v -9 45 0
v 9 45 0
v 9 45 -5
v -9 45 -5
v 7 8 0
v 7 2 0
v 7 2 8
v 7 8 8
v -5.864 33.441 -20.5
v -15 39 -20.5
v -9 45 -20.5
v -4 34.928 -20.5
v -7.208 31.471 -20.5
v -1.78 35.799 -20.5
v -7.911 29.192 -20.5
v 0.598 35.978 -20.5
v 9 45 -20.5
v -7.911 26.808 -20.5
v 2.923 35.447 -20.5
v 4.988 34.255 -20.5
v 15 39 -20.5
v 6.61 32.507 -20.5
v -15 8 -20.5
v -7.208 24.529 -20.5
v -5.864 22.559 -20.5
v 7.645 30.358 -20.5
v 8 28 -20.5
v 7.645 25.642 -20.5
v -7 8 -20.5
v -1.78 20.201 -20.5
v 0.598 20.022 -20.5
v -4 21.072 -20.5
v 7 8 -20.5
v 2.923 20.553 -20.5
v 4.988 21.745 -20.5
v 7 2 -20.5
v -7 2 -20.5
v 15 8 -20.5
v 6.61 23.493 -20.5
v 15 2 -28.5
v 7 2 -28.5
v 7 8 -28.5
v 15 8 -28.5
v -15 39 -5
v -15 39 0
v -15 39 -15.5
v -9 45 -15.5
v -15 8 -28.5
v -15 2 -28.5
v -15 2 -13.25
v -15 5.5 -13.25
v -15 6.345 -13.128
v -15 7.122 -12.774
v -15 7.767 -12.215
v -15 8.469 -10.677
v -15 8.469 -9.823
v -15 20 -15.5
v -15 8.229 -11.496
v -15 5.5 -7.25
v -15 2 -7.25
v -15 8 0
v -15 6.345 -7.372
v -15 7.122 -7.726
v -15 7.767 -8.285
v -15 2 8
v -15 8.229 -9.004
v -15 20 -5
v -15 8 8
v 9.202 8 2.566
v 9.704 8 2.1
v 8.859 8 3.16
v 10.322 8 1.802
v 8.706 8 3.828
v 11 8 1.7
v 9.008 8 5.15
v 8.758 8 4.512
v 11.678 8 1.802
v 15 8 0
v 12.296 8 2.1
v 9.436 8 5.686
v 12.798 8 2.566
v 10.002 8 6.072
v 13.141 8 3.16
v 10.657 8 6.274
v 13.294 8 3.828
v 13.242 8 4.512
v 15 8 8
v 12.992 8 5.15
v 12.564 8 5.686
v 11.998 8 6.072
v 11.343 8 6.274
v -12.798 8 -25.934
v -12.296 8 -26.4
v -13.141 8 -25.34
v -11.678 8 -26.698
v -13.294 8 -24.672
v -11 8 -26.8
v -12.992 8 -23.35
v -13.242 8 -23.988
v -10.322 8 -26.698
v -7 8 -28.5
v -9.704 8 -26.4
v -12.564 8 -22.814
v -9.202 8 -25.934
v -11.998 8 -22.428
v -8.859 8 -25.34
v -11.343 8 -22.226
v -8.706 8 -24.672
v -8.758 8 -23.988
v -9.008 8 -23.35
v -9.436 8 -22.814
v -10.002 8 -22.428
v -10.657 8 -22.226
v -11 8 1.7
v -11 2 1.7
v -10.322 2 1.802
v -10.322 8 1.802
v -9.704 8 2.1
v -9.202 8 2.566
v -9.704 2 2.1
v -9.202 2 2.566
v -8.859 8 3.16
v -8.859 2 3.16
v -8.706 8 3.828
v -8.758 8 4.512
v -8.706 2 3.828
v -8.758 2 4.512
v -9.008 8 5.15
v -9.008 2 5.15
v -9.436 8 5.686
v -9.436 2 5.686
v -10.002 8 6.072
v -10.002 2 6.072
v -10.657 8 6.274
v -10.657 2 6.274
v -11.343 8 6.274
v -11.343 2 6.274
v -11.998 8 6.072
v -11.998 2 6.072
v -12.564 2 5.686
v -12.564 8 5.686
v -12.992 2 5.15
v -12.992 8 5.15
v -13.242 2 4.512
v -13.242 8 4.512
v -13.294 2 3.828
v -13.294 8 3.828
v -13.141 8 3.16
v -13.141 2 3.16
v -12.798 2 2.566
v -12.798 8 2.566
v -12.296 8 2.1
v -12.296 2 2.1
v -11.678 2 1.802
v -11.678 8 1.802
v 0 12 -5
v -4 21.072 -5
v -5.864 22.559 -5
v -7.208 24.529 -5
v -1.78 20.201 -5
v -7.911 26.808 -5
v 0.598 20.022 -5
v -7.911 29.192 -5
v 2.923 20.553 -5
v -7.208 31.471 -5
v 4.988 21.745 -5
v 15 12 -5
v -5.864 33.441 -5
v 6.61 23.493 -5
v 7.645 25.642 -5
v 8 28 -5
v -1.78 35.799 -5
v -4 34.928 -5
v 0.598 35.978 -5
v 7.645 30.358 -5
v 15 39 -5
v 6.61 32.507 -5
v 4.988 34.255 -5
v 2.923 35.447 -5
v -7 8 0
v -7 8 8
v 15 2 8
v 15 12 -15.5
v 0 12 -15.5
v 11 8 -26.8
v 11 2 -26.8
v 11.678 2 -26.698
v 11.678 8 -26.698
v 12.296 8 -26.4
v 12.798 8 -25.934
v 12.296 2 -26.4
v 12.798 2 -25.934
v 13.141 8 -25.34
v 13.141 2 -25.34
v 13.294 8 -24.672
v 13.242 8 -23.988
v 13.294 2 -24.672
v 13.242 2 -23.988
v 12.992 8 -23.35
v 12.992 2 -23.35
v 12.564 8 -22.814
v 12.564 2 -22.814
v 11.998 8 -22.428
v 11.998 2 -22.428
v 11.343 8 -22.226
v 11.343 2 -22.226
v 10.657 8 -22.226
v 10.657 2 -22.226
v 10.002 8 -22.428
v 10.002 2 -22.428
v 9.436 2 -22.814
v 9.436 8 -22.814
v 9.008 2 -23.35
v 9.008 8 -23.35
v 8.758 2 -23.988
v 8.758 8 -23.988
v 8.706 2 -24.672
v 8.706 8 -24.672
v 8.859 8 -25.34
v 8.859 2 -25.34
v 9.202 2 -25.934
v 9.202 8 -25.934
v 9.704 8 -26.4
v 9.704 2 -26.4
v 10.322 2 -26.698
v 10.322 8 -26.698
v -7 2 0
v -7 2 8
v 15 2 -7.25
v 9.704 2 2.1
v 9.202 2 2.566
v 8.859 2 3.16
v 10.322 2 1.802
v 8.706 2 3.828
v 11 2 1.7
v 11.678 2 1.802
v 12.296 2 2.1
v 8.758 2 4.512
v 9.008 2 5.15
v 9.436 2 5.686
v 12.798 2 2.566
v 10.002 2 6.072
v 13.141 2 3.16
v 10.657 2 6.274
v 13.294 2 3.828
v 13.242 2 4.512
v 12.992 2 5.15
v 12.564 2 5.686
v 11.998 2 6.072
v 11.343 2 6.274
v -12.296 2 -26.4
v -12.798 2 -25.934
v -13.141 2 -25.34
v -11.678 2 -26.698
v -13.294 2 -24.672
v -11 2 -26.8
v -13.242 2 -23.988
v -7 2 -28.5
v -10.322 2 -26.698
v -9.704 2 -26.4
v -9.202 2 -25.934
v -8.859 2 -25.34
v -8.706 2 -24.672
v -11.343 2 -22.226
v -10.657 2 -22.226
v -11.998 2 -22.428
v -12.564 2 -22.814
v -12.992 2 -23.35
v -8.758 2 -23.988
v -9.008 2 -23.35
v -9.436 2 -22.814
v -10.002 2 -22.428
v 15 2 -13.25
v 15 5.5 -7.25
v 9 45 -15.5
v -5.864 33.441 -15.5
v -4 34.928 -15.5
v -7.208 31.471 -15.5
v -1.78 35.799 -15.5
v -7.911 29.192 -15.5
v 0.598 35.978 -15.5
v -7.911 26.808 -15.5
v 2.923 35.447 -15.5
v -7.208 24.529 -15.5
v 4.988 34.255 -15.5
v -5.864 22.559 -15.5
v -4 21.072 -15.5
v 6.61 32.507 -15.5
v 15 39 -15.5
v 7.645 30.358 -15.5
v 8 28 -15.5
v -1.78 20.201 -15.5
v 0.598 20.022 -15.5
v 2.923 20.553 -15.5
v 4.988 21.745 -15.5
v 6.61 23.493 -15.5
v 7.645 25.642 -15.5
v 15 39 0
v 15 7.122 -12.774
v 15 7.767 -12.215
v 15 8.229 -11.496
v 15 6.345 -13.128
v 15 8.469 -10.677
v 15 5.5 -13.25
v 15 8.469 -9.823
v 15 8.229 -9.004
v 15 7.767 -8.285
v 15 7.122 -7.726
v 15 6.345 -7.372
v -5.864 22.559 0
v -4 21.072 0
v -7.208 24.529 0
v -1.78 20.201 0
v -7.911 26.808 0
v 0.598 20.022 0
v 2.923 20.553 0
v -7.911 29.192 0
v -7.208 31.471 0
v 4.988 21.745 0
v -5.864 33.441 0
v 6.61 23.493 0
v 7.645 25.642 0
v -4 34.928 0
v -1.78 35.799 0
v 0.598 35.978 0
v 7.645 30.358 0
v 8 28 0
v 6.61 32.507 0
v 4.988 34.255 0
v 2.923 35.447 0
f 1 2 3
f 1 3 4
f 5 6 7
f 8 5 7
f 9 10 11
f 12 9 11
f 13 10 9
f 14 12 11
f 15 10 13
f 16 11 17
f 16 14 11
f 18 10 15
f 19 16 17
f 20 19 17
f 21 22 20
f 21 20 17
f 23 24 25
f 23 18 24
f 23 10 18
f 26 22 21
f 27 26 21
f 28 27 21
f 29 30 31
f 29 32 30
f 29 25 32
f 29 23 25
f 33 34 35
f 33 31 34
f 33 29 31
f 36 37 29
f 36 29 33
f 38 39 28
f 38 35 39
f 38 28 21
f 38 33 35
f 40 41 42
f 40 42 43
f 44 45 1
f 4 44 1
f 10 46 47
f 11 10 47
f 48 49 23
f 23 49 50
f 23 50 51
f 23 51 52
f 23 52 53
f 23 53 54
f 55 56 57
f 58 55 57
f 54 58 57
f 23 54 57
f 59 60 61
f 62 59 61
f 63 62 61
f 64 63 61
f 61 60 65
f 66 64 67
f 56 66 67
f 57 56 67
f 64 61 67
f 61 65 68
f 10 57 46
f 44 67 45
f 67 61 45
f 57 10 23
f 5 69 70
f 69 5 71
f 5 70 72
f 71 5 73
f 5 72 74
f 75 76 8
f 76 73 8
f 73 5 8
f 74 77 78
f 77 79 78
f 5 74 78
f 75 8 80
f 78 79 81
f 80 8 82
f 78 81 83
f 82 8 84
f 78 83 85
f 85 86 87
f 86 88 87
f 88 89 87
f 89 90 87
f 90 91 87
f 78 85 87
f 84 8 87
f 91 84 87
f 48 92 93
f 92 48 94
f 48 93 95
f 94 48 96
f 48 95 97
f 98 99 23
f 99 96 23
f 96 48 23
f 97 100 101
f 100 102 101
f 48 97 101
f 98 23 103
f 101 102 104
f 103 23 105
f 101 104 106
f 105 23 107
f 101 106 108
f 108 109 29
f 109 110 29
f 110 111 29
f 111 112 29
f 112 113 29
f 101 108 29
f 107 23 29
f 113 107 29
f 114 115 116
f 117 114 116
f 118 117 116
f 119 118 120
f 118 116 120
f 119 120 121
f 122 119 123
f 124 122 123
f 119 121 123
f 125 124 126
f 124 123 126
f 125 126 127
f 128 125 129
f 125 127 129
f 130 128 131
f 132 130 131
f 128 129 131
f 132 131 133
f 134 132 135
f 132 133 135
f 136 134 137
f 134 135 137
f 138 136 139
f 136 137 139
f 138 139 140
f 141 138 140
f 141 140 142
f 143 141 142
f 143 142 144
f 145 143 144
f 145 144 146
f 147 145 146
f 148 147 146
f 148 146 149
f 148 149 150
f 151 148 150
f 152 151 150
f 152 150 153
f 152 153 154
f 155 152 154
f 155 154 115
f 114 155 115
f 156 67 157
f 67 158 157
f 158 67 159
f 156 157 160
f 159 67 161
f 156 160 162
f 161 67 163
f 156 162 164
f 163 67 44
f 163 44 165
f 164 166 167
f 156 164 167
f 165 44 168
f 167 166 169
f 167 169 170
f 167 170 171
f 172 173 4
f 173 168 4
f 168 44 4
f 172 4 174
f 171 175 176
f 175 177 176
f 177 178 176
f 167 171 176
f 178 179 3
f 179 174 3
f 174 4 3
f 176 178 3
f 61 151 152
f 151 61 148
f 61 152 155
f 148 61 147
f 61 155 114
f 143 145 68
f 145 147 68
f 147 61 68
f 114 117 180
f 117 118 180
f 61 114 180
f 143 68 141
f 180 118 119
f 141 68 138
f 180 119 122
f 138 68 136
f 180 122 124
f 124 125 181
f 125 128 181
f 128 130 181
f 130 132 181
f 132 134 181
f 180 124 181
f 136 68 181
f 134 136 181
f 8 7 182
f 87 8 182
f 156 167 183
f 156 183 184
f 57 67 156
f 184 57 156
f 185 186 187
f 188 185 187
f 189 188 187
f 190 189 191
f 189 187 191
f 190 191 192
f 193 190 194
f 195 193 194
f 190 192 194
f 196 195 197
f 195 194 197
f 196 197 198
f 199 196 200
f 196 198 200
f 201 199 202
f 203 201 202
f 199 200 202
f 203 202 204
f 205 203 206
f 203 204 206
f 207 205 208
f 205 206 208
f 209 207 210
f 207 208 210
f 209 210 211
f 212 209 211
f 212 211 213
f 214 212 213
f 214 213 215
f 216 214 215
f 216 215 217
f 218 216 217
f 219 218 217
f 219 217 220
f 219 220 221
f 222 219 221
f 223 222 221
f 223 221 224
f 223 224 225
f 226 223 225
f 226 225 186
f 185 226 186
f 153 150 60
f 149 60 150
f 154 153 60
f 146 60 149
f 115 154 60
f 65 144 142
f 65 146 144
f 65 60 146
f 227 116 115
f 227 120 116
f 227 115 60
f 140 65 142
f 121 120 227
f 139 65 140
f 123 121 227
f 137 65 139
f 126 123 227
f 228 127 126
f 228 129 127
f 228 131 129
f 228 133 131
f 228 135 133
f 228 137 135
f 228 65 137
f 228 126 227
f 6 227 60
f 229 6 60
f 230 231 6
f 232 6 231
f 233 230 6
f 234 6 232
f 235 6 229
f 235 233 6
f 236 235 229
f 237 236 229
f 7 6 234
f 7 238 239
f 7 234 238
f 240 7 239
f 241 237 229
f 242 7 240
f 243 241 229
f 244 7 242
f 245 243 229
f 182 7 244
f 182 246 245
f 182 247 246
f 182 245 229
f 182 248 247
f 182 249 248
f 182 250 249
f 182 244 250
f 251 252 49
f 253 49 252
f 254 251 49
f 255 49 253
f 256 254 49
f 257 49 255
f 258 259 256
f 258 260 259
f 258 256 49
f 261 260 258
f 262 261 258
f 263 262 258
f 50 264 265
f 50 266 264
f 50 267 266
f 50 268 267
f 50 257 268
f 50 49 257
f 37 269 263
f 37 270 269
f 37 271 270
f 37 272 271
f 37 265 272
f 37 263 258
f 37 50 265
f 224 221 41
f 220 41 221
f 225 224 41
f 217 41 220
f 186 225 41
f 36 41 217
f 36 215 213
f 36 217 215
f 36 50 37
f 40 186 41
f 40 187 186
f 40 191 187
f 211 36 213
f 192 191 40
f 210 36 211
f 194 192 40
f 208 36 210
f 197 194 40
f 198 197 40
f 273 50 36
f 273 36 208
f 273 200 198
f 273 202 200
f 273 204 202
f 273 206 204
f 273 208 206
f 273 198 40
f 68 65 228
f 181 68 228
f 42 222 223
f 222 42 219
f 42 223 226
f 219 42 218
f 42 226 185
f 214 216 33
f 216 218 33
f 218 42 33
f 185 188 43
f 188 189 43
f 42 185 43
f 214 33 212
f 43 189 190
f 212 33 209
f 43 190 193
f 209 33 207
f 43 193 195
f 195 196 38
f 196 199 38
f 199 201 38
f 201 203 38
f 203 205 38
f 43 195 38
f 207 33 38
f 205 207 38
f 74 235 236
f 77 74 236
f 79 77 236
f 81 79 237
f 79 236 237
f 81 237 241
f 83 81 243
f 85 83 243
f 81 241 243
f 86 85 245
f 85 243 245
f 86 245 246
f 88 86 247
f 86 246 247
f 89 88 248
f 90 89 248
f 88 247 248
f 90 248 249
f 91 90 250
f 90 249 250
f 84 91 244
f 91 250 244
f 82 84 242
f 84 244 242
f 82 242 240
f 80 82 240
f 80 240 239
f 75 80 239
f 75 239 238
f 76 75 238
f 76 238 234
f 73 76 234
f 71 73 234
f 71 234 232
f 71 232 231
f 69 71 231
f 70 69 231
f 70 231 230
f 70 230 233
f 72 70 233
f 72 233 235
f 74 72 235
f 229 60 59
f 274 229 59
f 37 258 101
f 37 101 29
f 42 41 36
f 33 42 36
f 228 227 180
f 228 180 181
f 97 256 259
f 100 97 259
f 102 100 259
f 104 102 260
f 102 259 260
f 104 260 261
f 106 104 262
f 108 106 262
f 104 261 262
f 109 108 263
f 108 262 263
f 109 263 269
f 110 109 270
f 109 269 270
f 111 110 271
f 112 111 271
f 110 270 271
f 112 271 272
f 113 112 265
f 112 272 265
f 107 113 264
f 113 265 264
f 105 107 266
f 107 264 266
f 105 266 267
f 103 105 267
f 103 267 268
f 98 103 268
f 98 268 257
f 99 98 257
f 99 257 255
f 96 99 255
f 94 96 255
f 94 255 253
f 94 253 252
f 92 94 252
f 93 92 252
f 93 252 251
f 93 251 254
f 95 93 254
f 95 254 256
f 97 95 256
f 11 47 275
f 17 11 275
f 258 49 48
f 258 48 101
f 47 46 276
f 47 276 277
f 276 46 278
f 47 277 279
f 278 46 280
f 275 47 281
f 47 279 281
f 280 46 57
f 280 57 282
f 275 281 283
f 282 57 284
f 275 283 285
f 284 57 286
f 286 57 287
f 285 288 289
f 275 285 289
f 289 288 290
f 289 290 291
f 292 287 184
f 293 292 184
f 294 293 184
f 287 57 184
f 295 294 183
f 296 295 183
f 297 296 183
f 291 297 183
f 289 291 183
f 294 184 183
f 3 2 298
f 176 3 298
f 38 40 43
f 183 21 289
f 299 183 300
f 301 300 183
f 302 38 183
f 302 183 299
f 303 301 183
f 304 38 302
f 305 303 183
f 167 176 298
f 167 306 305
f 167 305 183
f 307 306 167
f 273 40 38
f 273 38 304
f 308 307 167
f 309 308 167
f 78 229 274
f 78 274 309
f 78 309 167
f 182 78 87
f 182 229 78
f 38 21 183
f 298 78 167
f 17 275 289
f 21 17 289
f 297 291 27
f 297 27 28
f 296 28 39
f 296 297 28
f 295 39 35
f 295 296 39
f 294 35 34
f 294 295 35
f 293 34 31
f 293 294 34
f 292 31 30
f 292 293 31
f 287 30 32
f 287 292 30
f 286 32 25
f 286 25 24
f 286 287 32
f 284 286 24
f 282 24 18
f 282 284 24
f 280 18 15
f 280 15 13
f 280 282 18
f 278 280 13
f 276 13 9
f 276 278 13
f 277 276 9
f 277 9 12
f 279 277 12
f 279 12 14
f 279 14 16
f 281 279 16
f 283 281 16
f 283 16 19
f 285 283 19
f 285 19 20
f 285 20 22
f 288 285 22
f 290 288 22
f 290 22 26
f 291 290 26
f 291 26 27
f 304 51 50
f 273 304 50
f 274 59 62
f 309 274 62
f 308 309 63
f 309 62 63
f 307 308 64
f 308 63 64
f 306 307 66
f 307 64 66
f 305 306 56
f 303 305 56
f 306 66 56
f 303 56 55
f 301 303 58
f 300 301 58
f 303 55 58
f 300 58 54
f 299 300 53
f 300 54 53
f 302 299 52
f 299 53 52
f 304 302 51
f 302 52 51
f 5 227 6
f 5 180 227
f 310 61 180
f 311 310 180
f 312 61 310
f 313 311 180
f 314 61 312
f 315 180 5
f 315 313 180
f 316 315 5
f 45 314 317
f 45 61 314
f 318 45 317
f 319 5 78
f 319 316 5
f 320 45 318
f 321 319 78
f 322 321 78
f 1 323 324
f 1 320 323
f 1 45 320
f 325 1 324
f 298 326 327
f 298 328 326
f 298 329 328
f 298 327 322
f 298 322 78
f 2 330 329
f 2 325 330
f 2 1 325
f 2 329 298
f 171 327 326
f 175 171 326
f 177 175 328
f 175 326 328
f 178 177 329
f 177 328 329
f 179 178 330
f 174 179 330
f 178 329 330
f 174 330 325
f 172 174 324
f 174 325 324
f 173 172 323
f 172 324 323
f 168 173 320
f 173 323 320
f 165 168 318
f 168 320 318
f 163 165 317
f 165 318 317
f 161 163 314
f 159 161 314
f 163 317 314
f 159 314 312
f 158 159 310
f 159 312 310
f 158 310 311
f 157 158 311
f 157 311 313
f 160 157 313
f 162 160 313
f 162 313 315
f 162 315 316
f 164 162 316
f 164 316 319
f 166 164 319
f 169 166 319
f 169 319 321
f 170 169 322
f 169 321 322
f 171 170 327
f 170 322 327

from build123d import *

# Parameters (mm, degrees)
ESQUISSE1_R             = 8
BOSS_EXTRU_1_DEPTH      = 5
ESQUISSE2_W             = 30
ESQUISSE2_H             = 12
BOSS_EXTRU_2_DEPTH      = 10.5
ESQUISSE4_W             = 30
ESQUISSE4_H             = 5
BOSS_EXTRU_3_DEPTH      = 45
ENL_V_START             = -10
ESQUISSE6_R             = 8
ENL_V_MAT_EXTRU_3_DEPTH = 10
ESQUISSE8_W             = 8
ESQUISSE8_H             = 8
ESQUISSE8_R             = 2.3
BOSS_EXTRU_4_DEPTH      = 8
ENL_V_MAT_EXTRU_4_DEPTH = 2
ENL_V_MAT_EXTRU_5_DEPTH = 50
ENL_V_MAT_EXTRU_6_DEPTH = 50
BOSS_EXTRU_5_DEPTH      = 10.5


with BuildPart() as part:
    # Esquisse1 → Boss.-Extru.1 (new body)
    with BuildSketch(Plane.XY):
        Polygon((0, 0), (15, 0), (15, 45), (-15, 45), (-15, 0), align=None)
        with Locations((0, 28)):
            Circle(ESQUISSE1_R, mode=Mode.SUBTRACT)
    extrude(amount=-BOSS_EXTRU_1_DEPTH)

    # Esquisse2 → Boss.-Extru.2 (add)
    with BuildSketch(Plane(origin=(0, 0, -5), x_dir=(-1, 0, 0), z_dir=(0, 0, -1))):
        with Locations((0, 6)):
            Rectangle(ESQUISSE2_W, ESQUISSE2_H)
    extrude(amount=BOSS_EXTRU_2_DEPTH)

    # Esquisse4 → Boss.-Extru.3 (add)
    with BuildSketch(Plane.XZ):
        with Locations((0, -18)):
            Rectangle(ESQUISSE4_W, ESQUISSE4_H)
    extrude(amount=-BOSS_EXTRU_3_DEPTH)

    # Esquisse6 → Enlèv. mat.-Extru.3 (cut)
    with BuildSketch(Plane(origin=(0, 0, -20.5), x_dir=(-1, 0, 0), z_dir=(0, 0, -1)).offset(ENL_V_START)):
        with Locations(Location((0, 28, 0), (0, 0, 180))):
            Circle(ESQUISSE6_R)
    extrude(amount=ENL_V_MAT_EXTRU_3_DEPTH, mode=Mode.SUBTRACT)

    # Esquisse8 → Boss.-Extru.4 (add)
    # profile 1 of 4: a face of its own
    with BuildSketch(Plane.XZ):
        with Locations((-11, 4)):
            Rectangle(ESQUISSE8_W, ESQUISSE8_H)
        with Locations(Location((-11, 4, 0), (0, 0, 270))):
            Circle(ESQUISSE8_R, mode=Mode.SUBTRACT)
    # profile 2 of 4: a face of its own
    with BuildSketch(Plane.XZ):
        with Locations((11, 4)):
            Rectangle(ESQUISSE8_W, ESQUISSE8_H)
        with Locations(Location((11, 4, 0), (0, 0, 270))):
            Circle(ESQUISSE8_R, mode=Mode.SUBTRACT)
    # profile 3 of 4: a face of its own
    with BuildSketch(Plane.XZ):
        with Locations((-11, -24.5)):
            Rectangle(ESQUISSE8_W, ESQUISSE8_H)
        with Locations(Location((-11, -24.5, 0), (0, 0, 270))):
            Circle(ESQUISSE8_R, mode=Mode.SUBTRACT)
    # profile 4 of 4: a face of its own
    with BuildSketch(Plane.XZ):
        with Locations((11, -24.5)):
            Rectangle(ESQUISSE8_W, ESQUISSE8_H)
        with Locations(Location((11, -24.5, 0), (0, 0, 270))):
            Circle(ESQUISSE8_R, mode=Mode.SUBTRACT)
    extrude(amount=-BOSS_EXTRU_4_DEPTH)

    # Esquisse9 → Enlèv. mat.-Extru.4 (cut)
    with BuildSketch(Plane.XZ):
        Polygon((-15, 8), (-15, -28.5), (-7, -28.5), (-7, -20.5), (7, -20.5), (7, -28.5), (15, -28.5), (15, 8), (7, 8), (7, 0), (-7, 0), (-7, 8), align=None)
    extrude(amount=-ENL_V_MAT_EXTRU_4_DEPTH, mode=Mode.SUBTRACT)

    # Esquisse10 → Enlèv. mat.-Extru.5 (cut)
    with BuildSketch(Plane.ZY.offset(15)):
        with BuildLine():
            Line((-13.25, 2), (-7.25, 2))
            Line((-7.25, 2), (-7.25, 5.5))
            ThreePointArc((-7.25, 5.5), (-10.25, 8.5), (-13.25, 5.5))
            Line((-13.25, 5.5), (-13.25, 2))
        make_face()
    extrude(amount=-ENL_V_MAT_EXTRU_5_DEPTH, mode=Mode.SUBTRACT)

    # Esquisse11 → Enlèv. mat.-Extru.6 (cut)
    with BuildSketch(Plane.XY):
        Polygon((-9, 45), (-15, 45), (-15, 39), align=None)
        Polygon((15, 45), (9, 45), (15, 39), align=None)
    extrude(amount=-ENL_V_MAT_EXTRU_6_DEPTH, mode=Mode.SUBTRACT)

    # Esquisse12 → Boss.-Extru.5 (add)
    with BuildSketch(Plane(origin=(0, 0, -5), x_dir=(-1, 0, 0), z_dir=(0, 0, -1))):
        Polygon((0, 12), (15, 12), (15, 20), align=None)
    extrude(amount=BOSS_EXTRU_5_DEPTH)


solid = part.part
